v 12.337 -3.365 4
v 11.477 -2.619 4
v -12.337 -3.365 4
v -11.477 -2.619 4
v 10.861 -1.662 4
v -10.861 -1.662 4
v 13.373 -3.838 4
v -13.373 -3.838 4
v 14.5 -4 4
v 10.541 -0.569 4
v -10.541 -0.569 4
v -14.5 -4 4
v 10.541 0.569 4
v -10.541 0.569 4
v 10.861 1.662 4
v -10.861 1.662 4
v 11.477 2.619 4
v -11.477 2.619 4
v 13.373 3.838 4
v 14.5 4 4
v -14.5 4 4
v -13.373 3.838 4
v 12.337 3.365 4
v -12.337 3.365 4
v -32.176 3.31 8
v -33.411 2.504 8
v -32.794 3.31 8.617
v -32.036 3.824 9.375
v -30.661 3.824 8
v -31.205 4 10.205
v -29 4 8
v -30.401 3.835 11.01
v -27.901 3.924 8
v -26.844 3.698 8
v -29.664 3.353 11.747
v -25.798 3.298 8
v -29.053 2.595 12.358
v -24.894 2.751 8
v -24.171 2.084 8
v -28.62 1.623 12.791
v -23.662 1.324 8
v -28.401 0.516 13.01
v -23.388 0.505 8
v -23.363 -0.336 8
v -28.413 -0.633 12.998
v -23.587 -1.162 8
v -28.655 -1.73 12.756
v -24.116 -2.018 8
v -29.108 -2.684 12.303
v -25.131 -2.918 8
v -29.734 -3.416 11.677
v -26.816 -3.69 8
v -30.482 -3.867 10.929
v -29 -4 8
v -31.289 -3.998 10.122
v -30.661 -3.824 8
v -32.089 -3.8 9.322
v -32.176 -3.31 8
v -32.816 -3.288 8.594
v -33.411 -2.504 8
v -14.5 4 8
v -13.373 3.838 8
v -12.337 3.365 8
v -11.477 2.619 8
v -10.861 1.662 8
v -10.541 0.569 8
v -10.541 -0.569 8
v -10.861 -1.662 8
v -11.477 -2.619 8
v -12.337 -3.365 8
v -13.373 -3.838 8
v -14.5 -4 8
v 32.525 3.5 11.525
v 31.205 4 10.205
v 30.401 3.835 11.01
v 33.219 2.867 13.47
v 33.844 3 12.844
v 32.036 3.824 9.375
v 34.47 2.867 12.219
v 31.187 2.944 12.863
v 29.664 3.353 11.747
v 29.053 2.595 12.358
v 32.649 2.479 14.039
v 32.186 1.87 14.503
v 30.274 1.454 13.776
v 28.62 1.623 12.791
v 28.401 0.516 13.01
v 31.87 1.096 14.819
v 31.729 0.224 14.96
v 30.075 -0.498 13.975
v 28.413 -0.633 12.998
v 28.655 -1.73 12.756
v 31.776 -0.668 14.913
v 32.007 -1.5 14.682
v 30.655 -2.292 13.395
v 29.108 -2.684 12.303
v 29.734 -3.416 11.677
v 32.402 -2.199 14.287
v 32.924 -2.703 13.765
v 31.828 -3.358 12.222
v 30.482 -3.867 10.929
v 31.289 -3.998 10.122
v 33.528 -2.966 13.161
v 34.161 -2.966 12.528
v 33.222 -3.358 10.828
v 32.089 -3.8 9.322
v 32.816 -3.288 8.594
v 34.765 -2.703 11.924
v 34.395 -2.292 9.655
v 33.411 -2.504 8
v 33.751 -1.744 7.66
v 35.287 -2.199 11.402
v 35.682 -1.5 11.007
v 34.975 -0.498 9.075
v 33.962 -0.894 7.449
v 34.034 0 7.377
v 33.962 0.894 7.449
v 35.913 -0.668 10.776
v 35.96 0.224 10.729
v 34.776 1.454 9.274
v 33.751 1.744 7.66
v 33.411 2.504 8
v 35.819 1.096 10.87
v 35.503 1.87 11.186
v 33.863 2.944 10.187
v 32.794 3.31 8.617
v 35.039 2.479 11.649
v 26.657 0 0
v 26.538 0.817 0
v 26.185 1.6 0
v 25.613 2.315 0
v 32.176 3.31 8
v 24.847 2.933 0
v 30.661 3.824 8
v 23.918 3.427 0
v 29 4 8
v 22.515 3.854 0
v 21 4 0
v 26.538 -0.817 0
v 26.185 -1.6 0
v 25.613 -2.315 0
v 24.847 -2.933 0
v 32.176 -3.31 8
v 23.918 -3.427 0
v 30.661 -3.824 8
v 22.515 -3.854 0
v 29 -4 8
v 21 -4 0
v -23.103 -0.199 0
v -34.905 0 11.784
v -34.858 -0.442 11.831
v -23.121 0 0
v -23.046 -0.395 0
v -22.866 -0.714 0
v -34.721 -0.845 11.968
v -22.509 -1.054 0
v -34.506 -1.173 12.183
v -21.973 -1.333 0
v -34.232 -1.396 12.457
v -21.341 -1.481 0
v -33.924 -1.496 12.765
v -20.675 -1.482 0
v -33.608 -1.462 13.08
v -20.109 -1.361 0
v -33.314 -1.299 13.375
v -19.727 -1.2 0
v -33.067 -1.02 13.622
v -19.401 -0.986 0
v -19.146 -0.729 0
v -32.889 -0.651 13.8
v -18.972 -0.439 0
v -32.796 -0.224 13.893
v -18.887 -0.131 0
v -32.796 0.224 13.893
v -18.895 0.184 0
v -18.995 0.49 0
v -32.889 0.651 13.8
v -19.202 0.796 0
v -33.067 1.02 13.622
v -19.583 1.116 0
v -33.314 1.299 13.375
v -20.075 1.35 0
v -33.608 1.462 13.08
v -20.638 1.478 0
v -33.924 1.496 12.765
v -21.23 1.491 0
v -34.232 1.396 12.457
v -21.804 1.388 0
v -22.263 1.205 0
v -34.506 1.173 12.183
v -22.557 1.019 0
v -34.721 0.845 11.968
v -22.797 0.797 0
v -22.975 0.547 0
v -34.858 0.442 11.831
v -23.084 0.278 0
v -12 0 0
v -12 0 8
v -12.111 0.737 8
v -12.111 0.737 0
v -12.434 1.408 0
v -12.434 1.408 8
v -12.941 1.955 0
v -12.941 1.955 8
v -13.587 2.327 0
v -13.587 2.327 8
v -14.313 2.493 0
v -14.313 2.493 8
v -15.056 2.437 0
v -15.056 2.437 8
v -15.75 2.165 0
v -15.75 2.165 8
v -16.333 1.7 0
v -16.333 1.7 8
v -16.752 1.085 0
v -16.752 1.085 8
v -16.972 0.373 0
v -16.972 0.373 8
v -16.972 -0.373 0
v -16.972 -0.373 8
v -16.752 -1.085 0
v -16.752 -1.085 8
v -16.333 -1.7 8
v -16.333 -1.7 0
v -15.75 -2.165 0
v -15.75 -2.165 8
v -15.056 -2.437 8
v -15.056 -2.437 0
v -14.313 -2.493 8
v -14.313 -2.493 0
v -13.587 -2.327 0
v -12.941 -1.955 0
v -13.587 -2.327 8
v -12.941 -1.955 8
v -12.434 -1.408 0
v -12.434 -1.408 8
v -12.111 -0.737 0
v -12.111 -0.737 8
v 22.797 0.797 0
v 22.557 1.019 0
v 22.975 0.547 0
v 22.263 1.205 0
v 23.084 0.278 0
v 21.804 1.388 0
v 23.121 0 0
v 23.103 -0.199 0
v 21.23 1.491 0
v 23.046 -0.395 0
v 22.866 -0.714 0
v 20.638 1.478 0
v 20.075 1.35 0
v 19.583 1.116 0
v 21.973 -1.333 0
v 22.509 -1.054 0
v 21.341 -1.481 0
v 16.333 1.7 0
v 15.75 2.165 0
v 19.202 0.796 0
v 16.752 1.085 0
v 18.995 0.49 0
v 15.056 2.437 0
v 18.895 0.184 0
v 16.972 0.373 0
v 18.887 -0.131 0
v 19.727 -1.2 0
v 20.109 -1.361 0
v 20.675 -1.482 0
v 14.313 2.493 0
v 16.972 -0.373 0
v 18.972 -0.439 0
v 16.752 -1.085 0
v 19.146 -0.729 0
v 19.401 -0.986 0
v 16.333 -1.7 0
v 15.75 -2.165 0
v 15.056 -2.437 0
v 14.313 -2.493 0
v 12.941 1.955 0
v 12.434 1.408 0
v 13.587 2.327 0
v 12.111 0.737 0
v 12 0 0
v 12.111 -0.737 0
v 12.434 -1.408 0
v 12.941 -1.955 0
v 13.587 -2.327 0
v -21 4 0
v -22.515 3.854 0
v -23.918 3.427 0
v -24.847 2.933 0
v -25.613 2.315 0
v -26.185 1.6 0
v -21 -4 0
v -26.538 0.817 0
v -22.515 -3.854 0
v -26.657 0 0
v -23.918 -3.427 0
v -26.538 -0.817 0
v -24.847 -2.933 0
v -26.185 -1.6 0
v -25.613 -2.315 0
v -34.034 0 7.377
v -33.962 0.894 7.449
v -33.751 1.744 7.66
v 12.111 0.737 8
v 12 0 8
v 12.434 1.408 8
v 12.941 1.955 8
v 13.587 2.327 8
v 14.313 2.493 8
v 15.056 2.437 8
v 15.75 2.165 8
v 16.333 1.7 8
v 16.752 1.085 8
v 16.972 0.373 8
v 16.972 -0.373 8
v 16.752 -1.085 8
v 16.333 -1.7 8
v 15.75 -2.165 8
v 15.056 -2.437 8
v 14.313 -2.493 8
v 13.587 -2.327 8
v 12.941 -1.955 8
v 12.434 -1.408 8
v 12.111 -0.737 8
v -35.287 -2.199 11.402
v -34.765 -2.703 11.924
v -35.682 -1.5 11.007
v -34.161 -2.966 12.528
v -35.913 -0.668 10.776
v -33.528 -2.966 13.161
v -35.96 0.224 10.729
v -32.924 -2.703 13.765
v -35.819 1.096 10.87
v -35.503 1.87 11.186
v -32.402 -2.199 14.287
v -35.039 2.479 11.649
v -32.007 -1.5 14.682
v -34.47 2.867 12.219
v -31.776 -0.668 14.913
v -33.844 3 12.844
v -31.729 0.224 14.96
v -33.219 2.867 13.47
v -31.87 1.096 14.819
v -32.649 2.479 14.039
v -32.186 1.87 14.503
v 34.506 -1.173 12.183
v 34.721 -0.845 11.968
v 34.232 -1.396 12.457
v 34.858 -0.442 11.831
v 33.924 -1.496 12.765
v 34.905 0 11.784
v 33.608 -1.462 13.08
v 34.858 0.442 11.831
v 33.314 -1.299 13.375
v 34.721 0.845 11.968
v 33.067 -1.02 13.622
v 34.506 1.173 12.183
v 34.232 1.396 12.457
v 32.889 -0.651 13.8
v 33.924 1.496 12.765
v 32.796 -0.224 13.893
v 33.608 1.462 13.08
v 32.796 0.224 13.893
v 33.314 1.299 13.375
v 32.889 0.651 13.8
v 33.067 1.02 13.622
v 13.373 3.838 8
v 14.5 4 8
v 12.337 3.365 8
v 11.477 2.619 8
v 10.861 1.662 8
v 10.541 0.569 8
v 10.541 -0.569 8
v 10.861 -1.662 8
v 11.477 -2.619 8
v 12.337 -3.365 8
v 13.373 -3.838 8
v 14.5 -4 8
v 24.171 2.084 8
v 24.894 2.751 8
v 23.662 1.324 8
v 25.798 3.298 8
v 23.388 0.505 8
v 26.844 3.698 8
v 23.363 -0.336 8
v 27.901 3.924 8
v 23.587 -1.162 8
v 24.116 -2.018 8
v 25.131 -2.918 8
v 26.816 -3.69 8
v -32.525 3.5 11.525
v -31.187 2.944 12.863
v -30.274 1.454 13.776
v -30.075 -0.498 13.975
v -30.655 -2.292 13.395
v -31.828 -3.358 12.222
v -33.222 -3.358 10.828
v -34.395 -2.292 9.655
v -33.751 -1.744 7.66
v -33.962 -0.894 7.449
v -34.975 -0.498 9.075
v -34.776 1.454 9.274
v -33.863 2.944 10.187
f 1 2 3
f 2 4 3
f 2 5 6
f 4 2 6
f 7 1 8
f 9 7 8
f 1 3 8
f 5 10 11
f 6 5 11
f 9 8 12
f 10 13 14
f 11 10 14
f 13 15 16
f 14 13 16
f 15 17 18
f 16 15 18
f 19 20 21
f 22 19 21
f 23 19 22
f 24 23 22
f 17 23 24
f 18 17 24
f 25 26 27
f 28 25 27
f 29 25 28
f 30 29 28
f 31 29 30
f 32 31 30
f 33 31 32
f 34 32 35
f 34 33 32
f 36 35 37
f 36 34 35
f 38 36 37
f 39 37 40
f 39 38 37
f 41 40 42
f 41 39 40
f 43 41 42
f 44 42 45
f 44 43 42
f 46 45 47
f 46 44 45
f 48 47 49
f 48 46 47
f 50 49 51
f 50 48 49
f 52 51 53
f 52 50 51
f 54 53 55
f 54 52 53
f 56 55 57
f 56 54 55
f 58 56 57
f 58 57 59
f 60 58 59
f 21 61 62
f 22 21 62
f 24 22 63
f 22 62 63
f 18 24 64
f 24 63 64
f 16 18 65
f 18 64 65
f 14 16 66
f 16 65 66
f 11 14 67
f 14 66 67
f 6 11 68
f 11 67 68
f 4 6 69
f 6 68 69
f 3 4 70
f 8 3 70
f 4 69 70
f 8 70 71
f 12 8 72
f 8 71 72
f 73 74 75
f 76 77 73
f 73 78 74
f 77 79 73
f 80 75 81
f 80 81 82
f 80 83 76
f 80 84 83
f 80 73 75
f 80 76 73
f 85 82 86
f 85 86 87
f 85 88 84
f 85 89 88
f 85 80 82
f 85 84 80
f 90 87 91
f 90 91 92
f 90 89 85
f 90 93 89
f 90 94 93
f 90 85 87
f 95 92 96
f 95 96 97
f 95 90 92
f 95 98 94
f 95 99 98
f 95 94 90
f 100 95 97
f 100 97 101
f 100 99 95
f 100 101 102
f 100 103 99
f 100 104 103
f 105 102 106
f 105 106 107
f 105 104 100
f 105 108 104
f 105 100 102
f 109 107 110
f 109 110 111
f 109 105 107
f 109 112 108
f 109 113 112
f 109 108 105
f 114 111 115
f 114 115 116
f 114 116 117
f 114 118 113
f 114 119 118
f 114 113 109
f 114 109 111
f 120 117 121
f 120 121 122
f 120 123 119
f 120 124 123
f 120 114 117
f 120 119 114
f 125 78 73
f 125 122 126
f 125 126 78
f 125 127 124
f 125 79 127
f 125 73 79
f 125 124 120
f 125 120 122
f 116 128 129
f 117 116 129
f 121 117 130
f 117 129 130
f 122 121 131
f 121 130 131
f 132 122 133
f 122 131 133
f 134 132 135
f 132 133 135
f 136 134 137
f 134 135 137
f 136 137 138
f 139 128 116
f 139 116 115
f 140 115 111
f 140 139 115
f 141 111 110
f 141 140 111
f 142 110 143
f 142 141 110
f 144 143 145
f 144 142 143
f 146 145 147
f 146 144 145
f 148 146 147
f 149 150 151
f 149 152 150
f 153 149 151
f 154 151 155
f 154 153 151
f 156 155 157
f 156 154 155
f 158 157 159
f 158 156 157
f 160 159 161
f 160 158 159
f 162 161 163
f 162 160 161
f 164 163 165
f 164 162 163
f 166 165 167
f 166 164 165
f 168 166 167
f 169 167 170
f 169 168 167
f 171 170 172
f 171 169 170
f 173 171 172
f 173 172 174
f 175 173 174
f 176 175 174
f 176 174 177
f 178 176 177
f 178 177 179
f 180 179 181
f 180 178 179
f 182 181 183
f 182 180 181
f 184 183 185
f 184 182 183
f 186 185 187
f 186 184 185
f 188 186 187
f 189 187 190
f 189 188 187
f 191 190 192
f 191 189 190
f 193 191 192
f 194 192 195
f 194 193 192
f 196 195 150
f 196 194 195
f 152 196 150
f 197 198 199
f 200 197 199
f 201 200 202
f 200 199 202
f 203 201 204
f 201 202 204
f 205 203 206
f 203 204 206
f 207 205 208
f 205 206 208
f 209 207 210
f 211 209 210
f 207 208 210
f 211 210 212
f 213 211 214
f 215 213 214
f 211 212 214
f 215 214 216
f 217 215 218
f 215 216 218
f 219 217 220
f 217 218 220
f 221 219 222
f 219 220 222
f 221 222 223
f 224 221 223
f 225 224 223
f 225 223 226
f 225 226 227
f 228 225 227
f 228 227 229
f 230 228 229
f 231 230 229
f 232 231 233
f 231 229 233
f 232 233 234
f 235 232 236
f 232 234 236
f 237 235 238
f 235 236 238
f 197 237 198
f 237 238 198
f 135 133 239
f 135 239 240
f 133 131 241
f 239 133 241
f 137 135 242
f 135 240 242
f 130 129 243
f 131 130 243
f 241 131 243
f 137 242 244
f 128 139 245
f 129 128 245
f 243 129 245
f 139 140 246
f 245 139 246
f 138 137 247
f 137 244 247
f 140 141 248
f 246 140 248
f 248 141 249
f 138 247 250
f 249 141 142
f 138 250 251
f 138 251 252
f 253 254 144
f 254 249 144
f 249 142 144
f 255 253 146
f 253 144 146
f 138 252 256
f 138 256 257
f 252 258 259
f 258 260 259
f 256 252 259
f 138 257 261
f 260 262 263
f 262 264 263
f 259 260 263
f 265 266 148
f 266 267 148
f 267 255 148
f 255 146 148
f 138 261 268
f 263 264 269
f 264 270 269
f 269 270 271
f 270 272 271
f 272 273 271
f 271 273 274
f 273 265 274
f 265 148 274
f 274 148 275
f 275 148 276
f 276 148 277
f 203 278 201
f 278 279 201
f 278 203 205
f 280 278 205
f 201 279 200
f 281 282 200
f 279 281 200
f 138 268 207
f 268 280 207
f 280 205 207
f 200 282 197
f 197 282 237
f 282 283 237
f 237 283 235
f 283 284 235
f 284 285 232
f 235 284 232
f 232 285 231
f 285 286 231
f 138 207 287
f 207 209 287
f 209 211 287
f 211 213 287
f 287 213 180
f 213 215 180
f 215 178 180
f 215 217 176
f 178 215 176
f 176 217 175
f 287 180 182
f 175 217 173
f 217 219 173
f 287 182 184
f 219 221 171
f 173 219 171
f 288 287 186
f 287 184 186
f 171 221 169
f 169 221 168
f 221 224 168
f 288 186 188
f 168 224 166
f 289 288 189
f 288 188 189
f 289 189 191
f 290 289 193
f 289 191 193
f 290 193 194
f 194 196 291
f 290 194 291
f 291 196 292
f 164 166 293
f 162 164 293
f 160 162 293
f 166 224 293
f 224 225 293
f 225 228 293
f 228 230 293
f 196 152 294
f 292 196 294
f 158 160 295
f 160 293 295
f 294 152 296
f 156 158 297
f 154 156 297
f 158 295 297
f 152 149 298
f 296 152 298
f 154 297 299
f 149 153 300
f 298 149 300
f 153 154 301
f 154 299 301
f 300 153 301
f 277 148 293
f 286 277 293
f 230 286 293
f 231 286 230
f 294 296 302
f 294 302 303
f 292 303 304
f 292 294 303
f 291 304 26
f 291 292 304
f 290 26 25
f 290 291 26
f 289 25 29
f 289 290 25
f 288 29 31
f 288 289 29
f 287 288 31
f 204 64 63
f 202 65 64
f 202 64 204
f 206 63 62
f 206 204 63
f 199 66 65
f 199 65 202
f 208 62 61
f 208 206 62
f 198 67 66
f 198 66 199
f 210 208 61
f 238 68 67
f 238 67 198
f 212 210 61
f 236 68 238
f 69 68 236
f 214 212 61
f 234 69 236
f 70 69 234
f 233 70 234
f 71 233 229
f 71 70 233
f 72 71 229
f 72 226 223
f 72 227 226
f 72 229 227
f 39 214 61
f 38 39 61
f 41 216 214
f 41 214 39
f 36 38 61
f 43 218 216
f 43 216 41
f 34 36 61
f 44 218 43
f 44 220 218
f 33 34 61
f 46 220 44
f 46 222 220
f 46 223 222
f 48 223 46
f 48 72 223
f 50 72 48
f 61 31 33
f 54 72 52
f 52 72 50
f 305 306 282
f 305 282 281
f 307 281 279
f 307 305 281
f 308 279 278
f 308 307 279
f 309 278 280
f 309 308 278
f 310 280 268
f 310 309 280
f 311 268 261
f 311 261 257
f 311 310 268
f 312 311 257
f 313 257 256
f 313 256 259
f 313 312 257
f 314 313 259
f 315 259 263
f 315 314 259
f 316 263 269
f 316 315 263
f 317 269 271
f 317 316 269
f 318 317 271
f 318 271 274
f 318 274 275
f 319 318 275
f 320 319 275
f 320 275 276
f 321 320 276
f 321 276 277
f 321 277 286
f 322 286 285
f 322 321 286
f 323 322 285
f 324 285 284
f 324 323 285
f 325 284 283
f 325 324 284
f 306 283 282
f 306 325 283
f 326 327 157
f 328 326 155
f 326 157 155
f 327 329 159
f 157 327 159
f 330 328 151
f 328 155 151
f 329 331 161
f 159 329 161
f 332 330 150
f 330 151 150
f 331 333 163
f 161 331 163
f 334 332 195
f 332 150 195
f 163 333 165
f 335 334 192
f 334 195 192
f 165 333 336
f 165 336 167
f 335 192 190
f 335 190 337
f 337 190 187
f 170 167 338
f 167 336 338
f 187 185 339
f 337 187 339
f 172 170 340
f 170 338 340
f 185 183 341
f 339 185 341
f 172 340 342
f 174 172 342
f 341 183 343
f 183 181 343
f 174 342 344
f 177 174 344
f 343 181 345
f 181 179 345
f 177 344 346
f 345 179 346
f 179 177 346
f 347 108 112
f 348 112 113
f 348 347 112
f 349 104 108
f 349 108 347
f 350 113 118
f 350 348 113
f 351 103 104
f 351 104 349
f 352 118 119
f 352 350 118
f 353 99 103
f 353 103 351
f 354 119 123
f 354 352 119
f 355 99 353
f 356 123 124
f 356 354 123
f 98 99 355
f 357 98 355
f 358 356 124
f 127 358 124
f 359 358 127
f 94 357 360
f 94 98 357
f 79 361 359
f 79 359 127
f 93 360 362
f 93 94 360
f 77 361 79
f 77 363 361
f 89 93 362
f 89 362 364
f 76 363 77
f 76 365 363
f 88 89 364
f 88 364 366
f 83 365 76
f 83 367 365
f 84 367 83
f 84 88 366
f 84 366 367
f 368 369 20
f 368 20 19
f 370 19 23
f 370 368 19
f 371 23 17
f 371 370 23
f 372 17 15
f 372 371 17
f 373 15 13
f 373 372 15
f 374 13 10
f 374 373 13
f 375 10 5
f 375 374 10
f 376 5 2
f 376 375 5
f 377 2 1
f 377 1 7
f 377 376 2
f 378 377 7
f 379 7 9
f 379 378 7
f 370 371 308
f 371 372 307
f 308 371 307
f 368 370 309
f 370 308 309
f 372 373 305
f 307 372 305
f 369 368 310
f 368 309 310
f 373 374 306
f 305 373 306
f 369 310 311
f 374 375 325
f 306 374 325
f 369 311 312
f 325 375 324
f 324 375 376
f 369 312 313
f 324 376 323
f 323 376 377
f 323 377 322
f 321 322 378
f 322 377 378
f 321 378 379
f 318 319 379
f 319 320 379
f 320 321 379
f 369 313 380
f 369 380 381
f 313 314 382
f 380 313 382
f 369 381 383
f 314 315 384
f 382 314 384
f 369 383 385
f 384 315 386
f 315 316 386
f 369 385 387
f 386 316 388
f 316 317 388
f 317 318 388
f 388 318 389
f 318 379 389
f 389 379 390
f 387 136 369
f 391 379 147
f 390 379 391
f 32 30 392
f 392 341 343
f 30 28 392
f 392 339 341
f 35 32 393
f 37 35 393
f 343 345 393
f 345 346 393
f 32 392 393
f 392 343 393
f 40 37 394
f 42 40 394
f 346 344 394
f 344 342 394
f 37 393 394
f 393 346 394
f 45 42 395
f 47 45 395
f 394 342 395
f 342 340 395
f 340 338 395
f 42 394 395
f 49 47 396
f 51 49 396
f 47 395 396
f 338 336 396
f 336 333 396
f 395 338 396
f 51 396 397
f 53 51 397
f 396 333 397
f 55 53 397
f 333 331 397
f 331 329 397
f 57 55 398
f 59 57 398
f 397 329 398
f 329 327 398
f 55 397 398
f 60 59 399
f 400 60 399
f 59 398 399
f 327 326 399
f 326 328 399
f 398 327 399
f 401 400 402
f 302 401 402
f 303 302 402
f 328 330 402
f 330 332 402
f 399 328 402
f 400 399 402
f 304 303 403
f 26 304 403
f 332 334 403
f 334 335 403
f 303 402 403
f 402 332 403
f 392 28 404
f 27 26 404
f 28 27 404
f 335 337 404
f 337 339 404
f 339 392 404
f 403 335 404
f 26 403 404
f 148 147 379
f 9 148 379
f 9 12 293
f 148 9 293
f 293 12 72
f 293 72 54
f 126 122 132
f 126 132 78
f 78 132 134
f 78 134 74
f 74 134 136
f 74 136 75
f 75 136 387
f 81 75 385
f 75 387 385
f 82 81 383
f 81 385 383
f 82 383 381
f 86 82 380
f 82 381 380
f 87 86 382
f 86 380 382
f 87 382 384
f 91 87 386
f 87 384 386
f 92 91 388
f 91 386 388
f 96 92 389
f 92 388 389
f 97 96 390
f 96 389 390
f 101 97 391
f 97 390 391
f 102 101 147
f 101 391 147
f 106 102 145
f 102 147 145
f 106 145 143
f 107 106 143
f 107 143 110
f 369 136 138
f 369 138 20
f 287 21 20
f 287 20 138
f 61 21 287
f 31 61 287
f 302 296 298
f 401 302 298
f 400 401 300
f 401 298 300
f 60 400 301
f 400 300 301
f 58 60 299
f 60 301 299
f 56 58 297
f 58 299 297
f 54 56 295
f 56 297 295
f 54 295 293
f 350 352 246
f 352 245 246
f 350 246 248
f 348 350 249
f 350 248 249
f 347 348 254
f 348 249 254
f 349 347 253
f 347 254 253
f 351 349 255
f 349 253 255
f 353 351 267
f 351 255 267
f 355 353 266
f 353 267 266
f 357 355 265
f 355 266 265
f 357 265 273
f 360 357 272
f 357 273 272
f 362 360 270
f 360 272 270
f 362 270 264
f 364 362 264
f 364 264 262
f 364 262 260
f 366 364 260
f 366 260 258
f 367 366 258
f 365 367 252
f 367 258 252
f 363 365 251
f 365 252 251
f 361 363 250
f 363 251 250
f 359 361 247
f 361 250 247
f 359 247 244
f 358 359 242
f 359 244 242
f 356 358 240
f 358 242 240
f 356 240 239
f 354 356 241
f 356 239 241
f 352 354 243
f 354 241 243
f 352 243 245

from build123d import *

# Parameters (mm, degrees)
F1_DEPTH  = 4
F2_R      = 3.99999
F3_R      = 2.5
F4_DEPTH  = 8
F6_DEPTH  = 4
F9_R      = 4
F10_DEPTH = 6.851053331


# Not quite as in the source:
# - a fillet or chamfer that OpenCascade refuses, or shapes differently, is made with other operations: its cross-section is extruded or revolved along the edge and cut away or added
# - a fillet or chamfer is up to 0.001 mm smaller than in the source, because OpenCascade refuses the exact size


with BuildPart() as f1:
    # F0 (on Front) → F1 (new body, symmetric)
    with BuildSketch(Plane.XZ):
        Polygon((-26.6568542495, 0), (0, 0), (0, 8), (-34.6568542495, 8), align=None)
    extrude(amount=F1_DEPTH, both=True)

    # F2 (radius 4 in the source; OpenCascade refuses exactly that, so slightly less here)
    f2_edges = [f1.edges().sort_by_distance(p)[0] for p in [
        (-30.656854, 4, 4),
        (-30.656854, -4, 4),
    ]]
    fillet(f2_edges, radius=F2_R)

    # F3 (on face) → F4 (cut, through all)
    with BuildSketch(Plane.XY.offset(8)):
        with Locations((-14.5, 0)):
            Circle(F3_R)
    extrude(amount=-F4_DEPTH, mode=Mode.SUBTRACT)

    # F5 (on face) → F6 (cut)
    with BuildSketch(Plane.XY.offset(8)):
        with BuildLine():
            ThreePointArc((-14.5, 4), (-10.5, 0), (-14.5, -4))
            Line((-14.5, -4), (0, -4))
            Line((0, -4), (0, 4))
            Line((0, 4), (-14.5, 4))
        make_face()
    extrude(amount=-F6_DEPTH, mode=Mode.SUBTRACT)

    # F9 (on line) → F10 (join, symmetric)
    with BuildSketch(Plane(origin=(-18.5, 0, 18.5), x_dir=(0, 1, 0), z_dir=(0.7071067812, 0, -0.7071067812))):
        with Locations((0, -14.8492424049)):
            Circle(F9_R)
    extrude(amount=F10_DEPTH, both=True)

    # F7 (on Front) → F11 (revolve, cut)
    with BuildSketch(Plane.XZ):
        Polygon((-20.5108239612, -2.6104963823), (-19.4501637894, -1.5498362106), (-43.5361095251, 22.5361095251), (-44.5967696969, 21.4754493533), align=None)
    revolve(axis=Axis((-31.4931366573, 0, 10.4931366573), (-0.7071067812, 0, 0.7071067812)), mode=Mode.SUBTRACT)

    # F12: chamfer of 1 x 3.7320508076 on 1 edges, made by hand

    # F12_s1 → F12_t2 (revolve, cut)
    with BuildSketch(Plane(origin=(-10.5, 0, -10.5), x_dir=(0, 1, 0), z_dir=(-0.7071067812, 0, -0.7071067812))):
        Polygon((4, -29.2819534274), (3, -33.0140042349), (4, -33.0140042349), align=None)
    revolve(axis=Axis((-33.8444262687, 0, 12.8444262687), (0.7071067812, 0, -0.7071067812)), mode=Mode.SUBTRACT)

    # F13: F1 across face


with BuildPart() as f1_1:
    add(f1.part)
    add(f1.part.mirror(Plane(origin=(0, 0, 2), x_dir=(0, 1, 0), z_dir=(1, 0, 0))))


solid = f1_1.part
